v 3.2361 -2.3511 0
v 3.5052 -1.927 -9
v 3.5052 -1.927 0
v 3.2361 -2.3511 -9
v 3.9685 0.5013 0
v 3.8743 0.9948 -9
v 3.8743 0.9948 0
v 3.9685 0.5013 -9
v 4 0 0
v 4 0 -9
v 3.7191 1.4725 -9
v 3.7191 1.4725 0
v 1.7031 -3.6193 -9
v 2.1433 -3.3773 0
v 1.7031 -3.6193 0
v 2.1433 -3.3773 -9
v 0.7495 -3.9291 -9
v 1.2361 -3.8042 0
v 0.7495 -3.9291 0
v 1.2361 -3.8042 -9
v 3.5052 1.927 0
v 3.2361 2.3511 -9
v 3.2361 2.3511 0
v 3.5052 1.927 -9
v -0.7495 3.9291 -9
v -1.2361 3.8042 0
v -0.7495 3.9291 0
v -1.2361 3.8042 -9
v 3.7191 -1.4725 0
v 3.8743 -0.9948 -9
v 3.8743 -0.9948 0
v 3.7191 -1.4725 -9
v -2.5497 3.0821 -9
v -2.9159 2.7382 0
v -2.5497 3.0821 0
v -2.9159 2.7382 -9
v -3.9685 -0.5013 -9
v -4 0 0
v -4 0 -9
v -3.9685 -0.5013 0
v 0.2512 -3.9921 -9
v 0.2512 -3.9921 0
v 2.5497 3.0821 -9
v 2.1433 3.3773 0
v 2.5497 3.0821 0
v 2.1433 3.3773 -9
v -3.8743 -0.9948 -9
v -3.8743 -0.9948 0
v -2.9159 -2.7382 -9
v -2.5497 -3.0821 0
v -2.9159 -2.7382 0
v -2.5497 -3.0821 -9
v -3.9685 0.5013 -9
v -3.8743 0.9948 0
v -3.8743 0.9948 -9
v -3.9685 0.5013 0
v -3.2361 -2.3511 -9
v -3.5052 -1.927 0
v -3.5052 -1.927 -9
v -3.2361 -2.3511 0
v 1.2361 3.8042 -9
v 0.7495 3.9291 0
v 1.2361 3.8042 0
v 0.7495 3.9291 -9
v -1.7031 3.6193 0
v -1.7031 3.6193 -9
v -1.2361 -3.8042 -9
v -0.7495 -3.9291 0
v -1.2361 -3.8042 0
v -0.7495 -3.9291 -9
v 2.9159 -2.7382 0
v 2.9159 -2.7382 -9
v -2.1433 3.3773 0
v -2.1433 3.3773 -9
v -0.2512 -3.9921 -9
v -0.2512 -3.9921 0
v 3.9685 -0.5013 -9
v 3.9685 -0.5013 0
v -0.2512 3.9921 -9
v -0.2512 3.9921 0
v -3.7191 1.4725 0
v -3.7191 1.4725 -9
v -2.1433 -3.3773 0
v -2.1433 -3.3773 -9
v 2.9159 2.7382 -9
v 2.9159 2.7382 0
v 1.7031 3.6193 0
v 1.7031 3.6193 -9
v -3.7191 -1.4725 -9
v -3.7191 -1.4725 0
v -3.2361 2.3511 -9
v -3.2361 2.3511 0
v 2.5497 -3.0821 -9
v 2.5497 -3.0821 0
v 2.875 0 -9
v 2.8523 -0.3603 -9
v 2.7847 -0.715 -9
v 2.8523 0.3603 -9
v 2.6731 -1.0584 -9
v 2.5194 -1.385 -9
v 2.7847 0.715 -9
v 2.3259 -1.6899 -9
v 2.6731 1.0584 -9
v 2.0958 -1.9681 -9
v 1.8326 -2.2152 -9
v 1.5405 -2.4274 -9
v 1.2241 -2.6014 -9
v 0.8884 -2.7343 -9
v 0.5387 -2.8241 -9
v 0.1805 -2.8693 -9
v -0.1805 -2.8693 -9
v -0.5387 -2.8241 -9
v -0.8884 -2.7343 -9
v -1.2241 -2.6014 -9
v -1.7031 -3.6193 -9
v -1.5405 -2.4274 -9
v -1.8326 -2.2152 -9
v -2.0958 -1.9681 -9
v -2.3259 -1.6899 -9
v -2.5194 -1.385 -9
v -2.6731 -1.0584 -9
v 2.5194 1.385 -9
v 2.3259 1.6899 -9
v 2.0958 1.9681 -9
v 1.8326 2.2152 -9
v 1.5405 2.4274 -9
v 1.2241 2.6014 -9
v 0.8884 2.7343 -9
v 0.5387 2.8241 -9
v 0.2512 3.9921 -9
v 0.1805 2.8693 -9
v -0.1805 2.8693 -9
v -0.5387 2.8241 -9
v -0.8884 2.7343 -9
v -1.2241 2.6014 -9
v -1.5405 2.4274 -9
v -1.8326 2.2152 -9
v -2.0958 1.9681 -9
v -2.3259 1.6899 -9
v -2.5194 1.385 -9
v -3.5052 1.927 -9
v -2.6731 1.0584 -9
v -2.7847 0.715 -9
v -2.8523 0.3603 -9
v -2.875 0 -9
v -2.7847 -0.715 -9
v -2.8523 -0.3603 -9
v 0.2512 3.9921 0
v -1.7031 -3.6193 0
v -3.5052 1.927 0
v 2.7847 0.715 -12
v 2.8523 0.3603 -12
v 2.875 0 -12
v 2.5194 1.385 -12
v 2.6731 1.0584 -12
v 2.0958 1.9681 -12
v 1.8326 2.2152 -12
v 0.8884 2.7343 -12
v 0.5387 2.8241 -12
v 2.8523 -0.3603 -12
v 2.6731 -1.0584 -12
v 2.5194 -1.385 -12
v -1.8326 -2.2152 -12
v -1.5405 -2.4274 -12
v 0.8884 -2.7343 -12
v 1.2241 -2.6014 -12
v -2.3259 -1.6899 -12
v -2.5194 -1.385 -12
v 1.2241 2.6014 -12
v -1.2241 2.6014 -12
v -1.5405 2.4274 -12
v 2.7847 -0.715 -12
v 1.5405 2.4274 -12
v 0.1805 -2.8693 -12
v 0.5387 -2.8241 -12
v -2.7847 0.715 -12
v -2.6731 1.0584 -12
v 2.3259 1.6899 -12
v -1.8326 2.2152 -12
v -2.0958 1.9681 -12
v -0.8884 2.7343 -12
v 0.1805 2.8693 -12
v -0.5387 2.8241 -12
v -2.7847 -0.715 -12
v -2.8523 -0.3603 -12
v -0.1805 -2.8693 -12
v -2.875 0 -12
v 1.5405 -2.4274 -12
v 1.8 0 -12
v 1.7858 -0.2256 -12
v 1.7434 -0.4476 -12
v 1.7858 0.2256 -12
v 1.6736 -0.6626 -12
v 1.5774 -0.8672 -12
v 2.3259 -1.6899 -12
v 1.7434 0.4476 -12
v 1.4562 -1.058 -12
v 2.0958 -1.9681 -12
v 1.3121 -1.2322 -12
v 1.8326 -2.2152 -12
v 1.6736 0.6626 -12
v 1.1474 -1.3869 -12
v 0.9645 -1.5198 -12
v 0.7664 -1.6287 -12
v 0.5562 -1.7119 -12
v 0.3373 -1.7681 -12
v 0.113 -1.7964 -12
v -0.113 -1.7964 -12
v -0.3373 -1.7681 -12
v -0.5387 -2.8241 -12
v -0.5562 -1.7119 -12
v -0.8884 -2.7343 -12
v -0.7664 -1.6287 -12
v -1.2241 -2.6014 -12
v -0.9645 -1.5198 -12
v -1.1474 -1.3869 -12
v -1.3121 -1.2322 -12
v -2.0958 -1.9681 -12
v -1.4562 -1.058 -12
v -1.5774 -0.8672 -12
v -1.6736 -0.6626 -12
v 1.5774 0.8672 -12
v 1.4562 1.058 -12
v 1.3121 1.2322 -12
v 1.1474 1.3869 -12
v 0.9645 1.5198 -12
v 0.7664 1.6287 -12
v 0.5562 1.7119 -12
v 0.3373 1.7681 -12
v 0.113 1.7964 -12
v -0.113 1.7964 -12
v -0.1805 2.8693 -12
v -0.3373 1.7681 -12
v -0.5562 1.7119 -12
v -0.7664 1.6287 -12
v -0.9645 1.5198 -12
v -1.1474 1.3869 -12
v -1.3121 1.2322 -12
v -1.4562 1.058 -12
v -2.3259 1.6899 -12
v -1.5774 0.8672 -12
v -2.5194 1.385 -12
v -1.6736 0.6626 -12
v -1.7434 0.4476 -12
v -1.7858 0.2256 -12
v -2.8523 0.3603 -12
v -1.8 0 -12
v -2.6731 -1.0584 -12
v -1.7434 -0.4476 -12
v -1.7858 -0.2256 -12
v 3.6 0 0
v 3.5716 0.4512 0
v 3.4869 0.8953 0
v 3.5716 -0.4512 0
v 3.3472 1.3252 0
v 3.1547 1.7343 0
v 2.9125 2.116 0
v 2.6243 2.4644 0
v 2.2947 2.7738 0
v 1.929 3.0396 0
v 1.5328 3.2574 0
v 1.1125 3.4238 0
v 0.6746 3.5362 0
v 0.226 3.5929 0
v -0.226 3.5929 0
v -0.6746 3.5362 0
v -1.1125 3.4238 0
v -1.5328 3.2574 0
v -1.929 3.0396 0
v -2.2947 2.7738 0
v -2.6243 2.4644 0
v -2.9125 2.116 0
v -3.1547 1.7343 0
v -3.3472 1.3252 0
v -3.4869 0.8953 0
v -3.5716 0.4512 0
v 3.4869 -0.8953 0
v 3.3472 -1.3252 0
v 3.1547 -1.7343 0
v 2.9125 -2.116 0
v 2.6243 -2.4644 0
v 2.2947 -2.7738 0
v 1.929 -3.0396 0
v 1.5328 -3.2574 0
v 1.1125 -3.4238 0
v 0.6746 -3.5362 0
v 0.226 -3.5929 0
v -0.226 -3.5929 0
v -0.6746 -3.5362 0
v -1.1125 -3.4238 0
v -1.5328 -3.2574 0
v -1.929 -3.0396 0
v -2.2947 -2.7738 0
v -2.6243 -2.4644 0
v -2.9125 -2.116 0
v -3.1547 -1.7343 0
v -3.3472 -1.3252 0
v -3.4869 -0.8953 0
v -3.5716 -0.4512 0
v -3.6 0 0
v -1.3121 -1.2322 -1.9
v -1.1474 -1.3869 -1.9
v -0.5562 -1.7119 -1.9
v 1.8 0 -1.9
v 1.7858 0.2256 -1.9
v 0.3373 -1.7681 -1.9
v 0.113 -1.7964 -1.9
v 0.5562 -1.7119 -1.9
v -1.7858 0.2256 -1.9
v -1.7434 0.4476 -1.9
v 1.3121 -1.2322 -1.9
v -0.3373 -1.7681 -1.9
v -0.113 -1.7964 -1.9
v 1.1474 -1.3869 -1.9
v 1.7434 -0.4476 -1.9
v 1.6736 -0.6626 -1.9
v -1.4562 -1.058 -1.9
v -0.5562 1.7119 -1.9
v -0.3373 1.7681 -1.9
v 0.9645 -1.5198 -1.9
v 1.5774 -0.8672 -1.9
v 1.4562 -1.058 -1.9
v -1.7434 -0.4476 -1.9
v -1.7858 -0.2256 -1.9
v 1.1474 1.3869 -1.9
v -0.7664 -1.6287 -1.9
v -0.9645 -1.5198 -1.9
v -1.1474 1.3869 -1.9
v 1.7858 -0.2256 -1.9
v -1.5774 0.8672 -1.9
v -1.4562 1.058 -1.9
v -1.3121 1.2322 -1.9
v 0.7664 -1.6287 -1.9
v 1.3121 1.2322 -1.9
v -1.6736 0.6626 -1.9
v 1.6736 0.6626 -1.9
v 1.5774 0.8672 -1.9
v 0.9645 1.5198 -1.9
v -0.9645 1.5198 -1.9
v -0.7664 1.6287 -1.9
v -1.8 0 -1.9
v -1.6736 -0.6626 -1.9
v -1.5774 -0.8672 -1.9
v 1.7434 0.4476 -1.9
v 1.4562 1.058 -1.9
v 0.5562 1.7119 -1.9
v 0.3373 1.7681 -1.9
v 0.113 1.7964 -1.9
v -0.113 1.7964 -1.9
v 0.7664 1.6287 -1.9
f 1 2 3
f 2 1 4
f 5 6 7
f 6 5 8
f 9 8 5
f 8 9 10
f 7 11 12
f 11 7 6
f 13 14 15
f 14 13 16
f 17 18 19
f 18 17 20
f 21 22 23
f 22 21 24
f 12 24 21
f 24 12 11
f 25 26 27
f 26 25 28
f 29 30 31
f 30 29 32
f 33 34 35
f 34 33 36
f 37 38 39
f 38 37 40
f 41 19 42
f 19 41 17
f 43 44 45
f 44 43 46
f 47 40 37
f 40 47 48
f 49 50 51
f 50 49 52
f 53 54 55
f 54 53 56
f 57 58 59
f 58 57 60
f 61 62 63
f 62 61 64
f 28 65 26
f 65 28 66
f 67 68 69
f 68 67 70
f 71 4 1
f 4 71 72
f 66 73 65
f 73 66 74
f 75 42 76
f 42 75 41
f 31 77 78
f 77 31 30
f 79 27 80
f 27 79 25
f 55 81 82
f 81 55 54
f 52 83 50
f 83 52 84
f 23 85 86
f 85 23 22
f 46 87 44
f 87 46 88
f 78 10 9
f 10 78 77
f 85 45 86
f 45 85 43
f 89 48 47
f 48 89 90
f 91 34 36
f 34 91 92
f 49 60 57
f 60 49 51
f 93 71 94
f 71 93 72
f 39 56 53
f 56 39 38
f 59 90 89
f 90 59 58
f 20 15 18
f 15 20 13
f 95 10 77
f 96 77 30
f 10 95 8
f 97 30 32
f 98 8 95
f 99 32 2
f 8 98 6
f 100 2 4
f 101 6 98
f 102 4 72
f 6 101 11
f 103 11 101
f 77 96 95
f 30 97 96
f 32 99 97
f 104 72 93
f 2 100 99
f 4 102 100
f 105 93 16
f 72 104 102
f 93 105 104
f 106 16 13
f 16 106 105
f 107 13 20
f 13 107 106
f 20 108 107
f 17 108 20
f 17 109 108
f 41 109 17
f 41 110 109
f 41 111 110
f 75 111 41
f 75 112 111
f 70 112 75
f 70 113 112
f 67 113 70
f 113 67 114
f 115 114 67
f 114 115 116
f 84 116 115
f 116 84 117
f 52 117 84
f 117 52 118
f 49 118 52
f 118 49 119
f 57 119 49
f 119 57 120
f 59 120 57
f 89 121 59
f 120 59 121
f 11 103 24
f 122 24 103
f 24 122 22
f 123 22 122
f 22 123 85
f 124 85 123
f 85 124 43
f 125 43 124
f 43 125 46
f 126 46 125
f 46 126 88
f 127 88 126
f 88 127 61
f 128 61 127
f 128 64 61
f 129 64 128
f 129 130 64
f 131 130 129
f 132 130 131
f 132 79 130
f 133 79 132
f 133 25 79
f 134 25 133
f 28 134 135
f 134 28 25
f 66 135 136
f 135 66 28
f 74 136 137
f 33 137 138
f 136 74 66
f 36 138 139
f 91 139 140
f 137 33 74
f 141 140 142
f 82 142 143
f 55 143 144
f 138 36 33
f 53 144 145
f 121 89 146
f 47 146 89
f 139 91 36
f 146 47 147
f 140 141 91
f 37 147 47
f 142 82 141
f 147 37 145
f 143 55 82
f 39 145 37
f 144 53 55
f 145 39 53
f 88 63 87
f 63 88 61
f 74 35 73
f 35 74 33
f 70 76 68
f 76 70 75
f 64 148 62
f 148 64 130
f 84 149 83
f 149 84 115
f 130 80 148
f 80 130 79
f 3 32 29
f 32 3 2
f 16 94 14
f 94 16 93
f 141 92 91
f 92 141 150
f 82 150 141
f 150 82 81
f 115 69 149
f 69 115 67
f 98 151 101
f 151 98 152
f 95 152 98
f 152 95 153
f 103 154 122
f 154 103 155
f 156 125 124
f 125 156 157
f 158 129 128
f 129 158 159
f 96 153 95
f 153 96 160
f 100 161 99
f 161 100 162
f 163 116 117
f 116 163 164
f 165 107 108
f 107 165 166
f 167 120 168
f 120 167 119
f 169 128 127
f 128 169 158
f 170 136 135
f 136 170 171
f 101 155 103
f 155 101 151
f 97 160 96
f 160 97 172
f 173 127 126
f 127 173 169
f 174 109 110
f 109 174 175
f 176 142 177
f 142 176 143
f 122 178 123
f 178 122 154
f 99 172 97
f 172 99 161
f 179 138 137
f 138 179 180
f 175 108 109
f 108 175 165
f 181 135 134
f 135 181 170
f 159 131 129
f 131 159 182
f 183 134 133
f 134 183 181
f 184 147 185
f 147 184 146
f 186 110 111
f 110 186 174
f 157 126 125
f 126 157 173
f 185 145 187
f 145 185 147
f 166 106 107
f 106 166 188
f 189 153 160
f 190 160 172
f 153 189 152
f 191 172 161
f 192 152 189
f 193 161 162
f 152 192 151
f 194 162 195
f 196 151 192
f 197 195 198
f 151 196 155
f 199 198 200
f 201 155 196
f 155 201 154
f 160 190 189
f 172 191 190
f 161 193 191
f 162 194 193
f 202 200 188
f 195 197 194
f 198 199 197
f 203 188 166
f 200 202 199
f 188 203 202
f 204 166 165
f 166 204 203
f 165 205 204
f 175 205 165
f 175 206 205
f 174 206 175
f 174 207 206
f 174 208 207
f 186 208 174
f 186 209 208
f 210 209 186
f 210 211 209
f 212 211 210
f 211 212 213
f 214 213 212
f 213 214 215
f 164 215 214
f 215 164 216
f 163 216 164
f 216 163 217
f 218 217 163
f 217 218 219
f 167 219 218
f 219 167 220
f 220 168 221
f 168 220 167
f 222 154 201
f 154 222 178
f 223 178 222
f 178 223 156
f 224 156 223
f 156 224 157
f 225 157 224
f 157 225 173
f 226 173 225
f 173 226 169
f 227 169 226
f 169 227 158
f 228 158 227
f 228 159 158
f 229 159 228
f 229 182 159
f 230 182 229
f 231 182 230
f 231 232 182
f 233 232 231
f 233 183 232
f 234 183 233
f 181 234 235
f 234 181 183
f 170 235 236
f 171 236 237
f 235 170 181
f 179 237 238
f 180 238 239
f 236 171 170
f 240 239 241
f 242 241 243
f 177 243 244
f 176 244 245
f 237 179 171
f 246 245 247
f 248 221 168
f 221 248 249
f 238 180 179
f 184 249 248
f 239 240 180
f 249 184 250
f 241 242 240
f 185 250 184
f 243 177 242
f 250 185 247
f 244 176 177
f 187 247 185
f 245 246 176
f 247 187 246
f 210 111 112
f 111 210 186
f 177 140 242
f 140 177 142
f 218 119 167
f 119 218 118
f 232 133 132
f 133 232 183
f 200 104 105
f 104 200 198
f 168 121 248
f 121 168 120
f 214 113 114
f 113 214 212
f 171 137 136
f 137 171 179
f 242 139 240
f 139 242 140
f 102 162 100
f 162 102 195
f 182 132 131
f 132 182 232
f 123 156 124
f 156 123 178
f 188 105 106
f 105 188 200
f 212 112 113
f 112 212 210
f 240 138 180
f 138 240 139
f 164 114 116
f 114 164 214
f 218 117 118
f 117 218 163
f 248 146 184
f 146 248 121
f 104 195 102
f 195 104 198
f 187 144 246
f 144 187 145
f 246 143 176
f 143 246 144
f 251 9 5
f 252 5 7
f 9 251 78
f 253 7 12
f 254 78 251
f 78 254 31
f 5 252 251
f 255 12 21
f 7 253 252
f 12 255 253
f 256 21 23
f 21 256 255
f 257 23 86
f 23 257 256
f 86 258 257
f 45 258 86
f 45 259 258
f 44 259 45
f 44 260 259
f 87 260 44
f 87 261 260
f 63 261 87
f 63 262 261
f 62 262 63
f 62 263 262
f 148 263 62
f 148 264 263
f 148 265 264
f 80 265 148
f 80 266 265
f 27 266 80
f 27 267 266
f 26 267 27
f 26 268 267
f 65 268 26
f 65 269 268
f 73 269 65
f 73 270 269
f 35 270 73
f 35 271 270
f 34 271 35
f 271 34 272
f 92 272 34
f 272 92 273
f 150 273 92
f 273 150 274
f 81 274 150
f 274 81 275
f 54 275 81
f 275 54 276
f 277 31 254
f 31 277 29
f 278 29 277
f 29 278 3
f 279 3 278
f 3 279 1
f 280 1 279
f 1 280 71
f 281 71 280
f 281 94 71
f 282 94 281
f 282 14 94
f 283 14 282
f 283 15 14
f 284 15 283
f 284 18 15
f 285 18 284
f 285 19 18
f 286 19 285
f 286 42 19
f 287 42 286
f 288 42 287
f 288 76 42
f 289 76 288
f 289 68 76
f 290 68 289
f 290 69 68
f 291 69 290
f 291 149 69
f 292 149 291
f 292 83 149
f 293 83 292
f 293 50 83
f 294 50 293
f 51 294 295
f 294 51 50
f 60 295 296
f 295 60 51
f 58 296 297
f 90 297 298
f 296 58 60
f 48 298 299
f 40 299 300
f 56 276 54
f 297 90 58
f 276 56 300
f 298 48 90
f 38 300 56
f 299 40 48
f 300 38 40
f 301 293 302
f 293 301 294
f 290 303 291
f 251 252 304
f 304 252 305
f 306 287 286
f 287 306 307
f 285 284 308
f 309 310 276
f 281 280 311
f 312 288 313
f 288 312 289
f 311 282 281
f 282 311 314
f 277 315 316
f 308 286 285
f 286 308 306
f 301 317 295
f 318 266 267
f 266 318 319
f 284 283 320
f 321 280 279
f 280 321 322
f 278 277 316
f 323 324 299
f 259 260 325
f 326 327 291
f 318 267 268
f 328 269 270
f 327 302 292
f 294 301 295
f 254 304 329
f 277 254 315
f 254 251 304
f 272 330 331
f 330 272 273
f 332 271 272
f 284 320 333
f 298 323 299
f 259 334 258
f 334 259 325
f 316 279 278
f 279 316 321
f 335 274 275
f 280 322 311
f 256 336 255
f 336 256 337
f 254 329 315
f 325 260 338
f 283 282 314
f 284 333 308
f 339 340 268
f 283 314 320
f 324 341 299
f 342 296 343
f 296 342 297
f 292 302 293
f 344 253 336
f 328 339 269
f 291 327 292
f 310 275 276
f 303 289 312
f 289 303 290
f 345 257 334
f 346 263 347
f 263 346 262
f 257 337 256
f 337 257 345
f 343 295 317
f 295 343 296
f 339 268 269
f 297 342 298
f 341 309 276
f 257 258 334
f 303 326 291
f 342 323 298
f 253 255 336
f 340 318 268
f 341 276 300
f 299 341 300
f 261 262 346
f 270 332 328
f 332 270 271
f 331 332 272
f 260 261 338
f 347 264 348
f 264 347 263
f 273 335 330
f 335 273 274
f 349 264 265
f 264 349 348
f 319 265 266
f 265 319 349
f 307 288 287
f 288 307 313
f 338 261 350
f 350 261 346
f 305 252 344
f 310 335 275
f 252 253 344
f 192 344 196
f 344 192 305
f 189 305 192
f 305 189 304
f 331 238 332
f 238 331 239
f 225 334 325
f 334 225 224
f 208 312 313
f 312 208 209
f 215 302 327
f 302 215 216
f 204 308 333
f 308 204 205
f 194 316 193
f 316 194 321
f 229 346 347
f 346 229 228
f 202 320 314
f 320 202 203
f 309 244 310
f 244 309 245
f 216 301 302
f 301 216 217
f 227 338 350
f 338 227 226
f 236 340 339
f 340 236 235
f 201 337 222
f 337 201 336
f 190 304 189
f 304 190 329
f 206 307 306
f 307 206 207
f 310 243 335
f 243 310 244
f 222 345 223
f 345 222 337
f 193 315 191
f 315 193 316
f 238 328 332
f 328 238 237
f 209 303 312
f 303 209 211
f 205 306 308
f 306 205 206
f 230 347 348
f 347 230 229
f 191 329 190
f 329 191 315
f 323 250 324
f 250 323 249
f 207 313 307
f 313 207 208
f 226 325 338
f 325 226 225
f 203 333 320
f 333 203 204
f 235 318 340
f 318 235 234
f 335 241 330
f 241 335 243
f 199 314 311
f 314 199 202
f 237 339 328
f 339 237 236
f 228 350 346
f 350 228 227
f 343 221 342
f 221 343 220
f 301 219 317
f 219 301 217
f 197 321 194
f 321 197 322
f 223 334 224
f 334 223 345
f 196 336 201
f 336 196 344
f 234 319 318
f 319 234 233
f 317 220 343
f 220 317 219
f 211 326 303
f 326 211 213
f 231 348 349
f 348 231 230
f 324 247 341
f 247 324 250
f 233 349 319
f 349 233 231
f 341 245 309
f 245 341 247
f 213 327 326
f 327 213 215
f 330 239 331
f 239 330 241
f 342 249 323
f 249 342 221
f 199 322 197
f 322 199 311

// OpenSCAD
$fn = 50;

difference() {
	union() {
		translate(v = [0, 0, -9.0]) {
			cylinder(h = 12, r = 4.0);
		}
		#translate(v = [0, 0, -12.0]) {
			cylinder(h = 12, r = 2.875);
		}
	}
	union() {
		translate(v = [0, 0, 0]) {
			rotate(a = [0, 0, 0]) {
				difference() {
					union() {
						translate(v = [0, 0, -12.0]) {
							cylinder(h = 12, r = 1.5);
						}
						translate(v = [0, 0, -1.9]) {
							cylinder(h = 1.9, r1 = 1.8, r2 = 3.6);
						}
						translate(v = [0, 0, -12.0]) {
							cylinder(h = 12, r = 1.8);
						}
						translate(v = [0, 0, -12.0]) {
							cylinder(h = 12, r = 1.5);
						}
					}
					union();
				}
			}
		}
		#cylinder(h = 3, r = 5.0);
	}
}
